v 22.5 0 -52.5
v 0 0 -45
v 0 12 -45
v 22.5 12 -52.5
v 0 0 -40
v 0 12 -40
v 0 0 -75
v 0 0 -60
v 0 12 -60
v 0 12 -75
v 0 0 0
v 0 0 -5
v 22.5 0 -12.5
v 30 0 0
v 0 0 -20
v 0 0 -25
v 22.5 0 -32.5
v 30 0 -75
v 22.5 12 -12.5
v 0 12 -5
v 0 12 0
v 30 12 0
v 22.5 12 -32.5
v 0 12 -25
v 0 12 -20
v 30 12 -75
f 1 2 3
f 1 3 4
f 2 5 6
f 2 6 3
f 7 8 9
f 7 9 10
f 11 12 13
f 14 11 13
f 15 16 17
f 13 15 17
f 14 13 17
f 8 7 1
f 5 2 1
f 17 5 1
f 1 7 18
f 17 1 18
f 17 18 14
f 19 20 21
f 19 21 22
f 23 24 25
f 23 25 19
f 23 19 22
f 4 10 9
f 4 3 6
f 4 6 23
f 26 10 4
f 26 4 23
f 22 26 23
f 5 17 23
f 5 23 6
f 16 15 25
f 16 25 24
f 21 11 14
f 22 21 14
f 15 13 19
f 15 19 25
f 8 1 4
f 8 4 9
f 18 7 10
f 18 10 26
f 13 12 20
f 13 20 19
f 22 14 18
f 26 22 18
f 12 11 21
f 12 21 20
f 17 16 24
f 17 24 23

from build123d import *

# Parameters (mm, degrees)
SKETCH1_W           = 30
SKETCH1_H           = 75
BOSS_EXTRUDE1_DEPTH = 12
CUT_EXTRUDE1_DEPTH  = 12
LPATTERN1_COUNT     = 3
LPATTERN1_PITCH     = 20


with BuildPart() as part:
    # Sketch1 → Boss-Extrude1 (new body)
    with BuildSketch(Plane(origin=(0, 0, 0), x_dir=(1, 0, 0), z_dir=(0, 1, 0))):
        with Locations((15, 37.5)):
            Rectangle(SKETCH1_W, SKETCH1_H)
    extrude(amount=BOSS_EXTRUDE1_DEPTH)

    # Sketch3 → Cut-Extrude1 (cut)
    with BuildSketch(Plane(origin=(0, 0, 0), x_dir=(1, 0, 0), z_dir=(0, 1, 0))):
        Polygon((0, 5), (22.5, 12.5), (0, 20), align=None)
    cut_extrude1 = extrude(amount=CUT_EXTRUDE1_DEPTH, mode=Mode.SUBTRACT)

    # LPattern1: Cut-Extrude1 ×3
    with Locations(*[(0, 0, -i * LPATTERN1_PITCH) for i in range(1, LPATTERN1_COUNT)]):
        add(cut_extrude1, mode=Mode.SUBTRACT)


solid = part.part
